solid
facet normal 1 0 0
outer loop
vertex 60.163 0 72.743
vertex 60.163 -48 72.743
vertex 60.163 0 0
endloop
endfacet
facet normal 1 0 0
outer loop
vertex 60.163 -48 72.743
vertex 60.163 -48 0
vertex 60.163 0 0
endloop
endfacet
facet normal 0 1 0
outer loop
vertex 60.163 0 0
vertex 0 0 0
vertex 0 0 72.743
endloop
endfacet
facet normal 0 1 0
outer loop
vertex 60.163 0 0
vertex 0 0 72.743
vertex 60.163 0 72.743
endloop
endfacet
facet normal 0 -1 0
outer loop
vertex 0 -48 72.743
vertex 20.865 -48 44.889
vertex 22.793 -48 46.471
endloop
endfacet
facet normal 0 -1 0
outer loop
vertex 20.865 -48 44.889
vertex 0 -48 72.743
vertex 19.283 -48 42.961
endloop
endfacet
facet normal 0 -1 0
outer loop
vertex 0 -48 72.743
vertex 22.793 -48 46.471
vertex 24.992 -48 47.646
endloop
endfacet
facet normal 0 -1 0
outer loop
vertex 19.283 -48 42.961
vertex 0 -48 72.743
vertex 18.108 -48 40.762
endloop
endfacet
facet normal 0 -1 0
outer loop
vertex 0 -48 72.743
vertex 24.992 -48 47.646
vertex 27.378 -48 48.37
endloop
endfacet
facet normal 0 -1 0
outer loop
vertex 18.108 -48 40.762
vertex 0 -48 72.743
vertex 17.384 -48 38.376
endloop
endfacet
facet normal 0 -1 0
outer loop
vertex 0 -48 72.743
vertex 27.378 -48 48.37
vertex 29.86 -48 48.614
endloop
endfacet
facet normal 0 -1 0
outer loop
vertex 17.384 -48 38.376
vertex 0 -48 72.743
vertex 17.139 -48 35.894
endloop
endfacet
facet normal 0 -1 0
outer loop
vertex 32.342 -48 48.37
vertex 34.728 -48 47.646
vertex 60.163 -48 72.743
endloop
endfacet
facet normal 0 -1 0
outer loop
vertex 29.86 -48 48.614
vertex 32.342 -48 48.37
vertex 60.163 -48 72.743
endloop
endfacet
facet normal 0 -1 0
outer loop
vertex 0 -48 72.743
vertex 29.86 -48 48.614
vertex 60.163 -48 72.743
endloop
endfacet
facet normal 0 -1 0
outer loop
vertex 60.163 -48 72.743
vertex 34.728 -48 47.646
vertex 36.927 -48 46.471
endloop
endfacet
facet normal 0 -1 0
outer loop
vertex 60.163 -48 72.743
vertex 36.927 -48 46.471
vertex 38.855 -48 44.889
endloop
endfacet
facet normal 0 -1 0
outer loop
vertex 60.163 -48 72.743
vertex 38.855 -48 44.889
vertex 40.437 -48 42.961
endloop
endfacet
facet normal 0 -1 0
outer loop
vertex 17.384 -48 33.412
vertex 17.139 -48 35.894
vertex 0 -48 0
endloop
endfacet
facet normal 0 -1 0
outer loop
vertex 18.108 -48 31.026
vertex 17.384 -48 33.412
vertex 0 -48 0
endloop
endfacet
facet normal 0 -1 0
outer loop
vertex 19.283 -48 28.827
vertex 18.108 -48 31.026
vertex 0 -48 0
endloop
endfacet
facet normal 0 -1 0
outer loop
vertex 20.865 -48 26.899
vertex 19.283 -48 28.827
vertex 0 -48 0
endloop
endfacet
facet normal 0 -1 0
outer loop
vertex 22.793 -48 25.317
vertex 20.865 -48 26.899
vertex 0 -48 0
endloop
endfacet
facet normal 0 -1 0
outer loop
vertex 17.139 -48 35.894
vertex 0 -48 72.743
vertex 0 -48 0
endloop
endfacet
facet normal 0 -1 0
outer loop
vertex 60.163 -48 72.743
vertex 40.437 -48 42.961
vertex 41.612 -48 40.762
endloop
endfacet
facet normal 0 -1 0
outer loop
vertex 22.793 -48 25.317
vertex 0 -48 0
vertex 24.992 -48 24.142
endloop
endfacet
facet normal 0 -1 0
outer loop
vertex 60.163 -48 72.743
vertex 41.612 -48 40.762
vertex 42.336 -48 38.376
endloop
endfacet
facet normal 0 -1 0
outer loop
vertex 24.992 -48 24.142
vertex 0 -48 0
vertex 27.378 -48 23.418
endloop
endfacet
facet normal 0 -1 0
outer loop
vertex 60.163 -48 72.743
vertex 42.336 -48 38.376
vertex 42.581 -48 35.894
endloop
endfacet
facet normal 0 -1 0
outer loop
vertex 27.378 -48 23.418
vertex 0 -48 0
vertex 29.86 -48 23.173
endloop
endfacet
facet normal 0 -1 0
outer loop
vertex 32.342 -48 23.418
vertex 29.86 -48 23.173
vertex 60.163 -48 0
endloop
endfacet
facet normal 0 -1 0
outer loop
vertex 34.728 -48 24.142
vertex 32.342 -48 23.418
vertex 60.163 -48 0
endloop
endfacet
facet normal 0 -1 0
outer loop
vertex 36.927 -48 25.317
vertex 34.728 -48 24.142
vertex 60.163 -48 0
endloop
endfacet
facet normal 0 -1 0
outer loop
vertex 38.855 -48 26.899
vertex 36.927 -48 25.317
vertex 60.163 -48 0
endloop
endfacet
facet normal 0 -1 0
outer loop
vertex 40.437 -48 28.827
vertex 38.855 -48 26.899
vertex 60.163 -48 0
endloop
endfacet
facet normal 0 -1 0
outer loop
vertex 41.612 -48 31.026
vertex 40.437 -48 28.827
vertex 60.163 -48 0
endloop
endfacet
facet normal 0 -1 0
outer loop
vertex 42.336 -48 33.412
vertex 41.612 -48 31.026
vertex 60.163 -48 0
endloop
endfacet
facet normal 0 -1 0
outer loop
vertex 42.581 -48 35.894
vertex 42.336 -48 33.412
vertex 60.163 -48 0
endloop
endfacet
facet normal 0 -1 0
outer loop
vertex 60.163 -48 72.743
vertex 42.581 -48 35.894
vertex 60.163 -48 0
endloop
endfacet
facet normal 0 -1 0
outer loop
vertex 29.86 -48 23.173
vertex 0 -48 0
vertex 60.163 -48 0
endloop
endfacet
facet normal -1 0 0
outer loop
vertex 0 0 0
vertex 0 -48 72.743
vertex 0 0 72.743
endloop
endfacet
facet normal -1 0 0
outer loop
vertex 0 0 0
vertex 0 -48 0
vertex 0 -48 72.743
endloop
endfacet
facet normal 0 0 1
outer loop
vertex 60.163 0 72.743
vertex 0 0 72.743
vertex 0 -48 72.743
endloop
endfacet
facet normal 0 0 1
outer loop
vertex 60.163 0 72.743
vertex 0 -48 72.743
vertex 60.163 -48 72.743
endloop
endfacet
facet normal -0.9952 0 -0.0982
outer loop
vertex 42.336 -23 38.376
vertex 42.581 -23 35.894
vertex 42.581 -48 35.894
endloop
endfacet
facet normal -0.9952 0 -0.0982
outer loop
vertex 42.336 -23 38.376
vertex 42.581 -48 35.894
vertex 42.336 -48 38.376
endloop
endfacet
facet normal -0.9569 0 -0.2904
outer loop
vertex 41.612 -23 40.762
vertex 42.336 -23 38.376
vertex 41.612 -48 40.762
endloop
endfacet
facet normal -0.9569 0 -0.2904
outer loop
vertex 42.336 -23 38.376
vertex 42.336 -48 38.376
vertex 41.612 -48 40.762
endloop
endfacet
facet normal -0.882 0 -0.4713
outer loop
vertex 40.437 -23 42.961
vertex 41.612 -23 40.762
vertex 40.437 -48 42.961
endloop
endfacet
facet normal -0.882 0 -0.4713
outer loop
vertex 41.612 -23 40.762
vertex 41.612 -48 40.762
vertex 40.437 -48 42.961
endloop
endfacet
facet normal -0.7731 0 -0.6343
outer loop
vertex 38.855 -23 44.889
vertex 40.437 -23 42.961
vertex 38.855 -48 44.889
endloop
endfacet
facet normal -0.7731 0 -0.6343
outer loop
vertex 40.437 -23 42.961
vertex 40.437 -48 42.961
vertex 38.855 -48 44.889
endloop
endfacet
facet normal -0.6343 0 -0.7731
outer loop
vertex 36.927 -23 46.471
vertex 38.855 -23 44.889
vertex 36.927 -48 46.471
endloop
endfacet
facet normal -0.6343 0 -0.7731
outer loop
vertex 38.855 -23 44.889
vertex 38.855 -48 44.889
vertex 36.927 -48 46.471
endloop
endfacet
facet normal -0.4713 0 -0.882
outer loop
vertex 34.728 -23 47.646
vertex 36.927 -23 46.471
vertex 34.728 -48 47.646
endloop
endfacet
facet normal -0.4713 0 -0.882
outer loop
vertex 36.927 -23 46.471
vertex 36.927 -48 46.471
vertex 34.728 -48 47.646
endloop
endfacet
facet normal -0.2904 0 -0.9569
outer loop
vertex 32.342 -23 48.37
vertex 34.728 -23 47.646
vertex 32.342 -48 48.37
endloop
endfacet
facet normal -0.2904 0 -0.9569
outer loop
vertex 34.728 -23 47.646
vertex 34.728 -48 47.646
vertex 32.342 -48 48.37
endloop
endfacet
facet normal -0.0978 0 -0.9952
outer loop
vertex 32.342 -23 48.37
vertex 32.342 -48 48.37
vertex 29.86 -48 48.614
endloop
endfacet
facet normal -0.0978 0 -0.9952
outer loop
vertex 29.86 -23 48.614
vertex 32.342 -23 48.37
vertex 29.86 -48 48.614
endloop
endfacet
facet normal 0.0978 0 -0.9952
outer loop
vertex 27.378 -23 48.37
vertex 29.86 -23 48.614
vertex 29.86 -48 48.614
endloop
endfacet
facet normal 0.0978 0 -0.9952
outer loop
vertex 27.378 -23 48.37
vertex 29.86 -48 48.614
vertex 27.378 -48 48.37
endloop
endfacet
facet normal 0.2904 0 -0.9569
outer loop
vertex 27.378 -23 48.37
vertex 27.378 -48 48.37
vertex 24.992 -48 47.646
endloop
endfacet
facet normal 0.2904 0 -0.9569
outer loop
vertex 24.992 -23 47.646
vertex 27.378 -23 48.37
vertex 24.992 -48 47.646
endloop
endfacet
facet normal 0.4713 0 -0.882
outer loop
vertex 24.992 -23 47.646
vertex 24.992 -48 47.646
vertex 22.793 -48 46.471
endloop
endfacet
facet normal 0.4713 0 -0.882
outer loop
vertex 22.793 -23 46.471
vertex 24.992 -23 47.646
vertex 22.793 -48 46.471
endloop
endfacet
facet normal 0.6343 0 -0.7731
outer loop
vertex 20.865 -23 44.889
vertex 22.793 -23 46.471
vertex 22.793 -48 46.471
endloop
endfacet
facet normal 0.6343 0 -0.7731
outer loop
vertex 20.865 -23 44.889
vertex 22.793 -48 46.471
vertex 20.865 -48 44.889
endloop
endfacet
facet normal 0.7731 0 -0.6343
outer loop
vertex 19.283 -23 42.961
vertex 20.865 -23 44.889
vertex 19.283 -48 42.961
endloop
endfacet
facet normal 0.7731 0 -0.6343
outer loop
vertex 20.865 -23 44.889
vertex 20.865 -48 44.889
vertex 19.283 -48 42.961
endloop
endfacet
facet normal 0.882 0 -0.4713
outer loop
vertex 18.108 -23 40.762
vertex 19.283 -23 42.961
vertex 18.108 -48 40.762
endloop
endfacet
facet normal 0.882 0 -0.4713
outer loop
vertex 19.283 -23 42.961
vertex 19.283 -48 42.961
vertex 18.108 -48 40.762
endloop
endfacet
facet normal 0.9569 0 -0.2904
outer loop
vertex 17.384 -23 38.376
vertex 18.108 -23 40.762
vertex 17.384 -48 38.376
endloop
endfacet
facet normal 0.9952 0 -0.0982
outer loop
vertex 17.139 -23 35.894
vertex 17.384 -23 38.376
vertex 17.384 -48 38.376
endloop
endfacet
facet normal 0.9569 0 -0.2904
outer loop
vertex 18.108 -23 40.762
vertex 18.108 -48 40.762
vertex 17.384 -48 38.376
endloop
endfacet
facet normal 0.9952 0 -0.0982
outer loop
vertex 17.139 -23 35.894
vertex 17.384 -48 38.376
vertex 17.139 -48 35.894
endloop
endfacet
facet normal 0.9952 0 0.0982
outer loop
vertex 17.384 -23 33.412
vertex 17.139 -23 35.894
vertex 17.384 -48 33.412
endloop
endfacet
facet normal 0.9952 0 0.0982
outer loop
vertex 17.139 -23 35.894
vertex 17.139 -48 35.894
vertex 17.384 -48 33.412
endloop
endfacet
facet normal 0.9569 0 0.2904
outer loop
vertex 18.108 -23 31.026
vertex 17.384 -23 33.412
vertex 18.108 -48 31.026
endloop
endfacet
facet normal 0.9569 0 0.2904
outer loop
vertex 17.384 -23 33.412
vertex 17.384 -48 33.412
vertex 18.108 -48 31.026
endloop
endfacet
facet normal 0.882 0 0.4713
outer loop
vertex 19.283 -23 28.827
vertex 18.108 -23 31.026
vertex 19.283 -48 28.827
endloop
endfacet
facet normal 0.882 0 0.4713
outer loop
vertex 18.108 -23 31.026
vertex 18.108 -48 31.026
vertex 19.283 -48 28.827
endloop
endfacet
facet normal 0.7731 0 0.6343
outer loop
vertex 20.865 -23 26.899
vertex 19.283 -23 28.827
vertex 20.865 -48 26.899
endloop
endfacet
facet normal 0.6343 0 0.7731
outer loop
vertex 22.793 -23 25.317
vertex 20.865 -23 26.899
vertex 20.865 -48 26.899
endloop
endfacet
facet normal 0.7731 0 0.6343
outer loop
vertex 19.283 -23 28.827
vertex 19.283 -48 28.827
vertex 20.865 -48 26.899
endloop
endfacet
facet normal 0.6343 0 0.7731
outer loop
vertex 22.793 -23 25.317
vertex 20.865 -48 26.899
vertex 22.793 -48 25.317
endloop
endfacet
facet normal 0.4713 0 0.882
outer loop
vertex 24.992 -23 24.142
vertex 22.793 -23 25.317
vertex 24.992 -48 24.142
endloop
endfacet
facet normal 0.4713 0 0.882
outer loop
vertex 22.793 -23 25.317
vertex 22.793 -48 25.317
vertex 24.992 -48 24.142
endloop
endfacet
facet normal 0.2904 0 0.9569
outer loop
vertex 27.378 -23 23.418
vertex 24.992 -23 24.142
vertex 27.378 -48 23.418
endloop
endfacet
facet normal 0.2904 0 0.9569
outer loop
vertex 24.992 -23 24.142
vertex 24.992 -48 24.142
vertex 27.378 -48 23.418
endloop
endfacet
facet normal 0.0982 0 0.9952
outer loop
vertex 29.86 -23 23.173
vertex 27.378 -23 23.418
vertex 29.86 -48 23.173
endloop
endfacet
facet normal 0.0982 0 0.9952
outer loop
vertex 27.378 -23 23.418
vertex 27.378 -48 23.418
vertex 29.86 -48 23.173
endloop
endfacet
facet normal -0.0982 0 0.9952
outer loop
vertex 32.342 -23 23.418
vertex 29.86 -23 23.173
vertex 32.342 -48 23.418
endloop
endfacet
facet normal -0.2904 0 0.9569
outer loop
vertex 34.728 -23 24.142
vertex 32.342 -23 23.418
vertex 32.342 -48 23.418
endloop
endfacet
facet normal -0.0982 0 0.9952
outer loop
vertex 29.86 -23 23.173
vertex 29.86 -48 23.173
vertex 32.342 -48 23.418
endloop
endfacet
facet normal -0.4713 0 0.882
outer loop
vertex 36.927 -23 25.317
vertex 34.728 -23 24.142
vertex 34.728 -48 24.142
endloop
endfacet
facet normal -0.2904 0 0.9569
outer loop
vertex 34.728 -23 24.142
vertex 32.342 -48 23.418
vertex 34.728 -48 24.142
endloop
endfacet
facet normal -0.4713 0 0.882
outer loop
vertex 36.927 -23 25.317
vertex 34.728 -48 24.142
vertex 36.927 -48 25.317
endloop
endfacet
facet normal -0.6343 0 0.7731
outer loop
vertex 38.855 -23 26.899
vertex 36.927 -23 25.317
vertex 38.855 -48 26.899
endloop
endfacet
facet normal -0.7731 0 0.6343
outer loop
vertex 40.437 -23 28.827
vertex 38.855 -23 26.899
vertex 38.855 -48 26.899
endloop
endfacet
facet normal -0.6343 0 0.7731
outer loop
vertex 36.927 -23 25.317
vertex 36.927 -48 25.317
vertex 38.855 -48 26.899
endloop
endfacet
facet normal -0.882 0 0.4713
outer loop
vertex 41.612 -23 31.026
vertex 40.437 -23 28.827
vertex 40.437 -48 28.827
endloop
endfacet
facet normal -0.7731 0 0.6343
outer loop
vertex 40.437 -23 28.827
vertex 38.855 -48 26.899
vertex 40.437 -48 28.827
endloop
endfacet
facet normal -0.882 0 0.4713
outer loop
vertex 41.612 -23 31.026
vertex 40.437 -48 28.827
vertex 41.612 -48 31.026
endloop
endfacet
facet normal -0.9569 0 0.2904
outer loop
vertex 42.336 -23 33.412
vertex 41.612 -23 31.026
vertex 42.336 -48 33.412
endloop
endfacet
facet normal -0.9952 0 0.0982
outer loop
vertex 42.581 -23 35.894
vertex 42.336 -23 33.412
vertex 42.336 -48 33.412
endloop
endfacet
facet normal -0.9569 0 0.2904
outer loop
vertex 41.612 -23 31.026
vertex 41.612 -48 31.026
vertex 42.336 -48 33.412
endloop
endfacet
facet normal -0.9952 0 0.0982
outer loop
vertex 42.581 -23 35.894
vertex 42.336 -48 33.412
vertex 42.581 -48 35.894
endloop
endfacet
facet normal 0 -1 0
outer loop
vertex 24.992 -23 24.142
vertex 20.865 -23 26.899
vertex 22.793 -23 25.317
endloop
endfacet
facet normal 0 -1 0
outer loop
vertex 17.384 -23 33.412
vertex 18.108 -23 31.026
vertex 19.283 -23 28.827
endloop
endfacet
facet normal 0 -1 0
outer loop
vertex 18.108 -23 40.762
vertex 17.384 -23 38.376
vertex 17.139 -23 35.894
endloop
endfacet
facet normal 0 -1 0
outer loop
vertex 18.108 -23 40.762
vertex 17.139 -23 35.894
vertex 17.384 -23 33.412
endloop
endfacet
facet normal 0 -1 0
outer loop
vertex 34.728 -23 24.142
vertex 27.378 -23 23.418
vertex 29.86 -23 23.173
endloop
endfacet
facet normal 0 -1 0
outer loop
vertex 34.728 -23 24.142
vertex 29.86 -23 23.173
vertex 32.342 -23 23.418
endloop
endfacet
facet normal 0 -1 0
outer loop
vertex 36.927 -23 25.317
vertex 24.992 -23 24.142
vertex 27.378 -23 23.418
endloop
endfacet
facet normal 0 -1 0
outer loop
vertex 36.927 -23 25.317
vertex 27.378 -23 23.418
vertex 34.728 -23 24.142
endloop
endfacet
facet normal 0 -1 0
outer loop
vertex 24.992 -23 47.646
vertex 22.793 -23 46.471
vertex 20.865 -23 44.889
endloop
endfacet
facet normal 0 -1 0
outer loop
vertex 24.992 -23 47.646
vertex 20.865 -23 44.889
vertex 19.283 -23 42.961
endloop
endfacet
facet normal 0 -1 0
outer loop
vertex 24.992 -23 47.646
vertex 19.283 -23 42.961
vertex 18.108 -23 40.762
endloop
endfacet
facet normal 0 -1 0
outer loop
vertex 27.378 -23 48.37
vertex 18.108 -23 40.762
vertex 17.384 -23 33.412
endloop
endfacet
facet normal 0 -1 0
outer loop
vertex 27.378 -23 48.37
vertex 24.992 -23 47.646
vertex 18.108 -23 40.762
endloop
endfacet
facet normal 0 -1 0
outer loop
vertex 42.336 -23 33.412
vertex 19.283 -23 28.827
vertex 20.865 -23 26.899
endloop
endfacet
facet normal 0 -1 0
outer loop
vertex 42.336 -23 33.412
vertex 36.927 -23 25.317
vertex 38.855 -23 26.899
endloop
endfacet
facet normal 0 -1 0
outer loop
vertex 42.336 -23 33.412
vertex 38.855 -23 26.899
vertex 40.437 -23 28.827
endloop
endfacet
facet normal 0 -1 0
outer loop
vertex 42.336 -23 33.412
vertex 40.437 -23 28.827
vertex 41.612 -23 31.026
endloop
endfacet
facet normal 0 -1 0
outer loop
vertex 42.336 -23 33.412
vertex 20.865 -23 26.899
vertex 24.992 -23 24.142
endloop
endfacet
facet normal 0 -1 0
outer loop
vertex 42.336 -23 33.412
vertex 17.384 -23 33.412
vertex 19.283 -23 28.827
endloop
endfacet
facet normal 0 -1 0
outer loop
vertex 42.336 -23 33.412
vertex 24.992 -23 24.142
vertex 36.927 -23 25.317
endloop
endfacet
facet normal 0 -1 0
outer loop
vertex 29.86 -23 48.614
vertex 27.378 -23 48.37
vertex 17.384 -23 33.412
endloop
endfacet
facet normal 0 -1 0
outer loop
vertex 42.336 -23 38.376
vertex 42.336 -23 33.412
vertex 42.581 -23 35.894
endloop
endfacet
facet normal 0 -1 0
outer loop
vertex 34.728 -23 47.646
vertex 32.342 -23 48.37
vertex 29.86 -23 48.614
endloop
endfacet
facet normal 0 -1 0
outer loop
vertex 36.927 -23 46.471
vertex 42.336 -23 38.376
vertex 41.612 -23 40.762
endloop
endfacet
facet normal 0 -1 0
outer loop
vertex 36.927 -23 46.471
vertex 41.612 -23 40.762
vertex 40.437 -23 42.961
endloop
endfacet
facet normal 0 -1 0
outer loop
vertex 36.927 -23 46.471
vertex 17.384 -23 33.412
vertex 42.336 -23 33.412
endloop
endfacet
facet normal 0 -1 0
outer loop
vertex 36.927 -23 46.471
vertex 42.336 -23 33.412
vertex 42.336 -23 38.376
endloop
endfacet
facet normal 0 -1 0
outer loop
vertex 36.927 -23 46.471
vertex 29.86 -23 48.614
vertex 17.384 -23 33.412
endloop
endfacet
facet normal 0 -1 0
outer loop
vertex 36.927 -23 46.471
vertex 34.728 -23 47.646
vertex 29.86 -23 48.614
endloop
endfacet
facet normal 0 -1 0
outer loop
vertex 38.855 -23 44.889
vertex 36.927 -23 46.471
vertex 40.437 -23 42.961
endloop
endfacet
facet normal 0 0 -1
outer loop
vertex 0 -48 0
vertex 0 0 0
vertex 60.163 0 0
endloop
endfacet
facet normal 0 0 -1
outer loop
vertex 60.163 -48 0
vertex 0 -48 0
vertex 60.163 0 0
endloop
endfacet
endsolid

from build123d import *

# Parameters (mm, degrees)
F0_W      = 60.16257
F0_H      = 62.742576
F1_DEPTH  = 48
F1_FACE_W = 60.16257
F1_FACE_H = 48
F2_DEPTH  = 10
F4_R      = 12.38494
F5_DEPTH  = 30
F3_R      = 12.720557
F6_DEPTH  = 25


with BuildPart() as f1:
    # F0 (on Front) → F1 (new body)
    with BuildSketch(Plane.XZ):
        with Locations((30.081285, 31.371288)):
            Rectangle(F0_W, F0_H)
    extrude(amount=F1_DEPTH)

    # F1_face (on face) → F2 (join)
    with BuildSketch(Plane(origin=(30.081285, -24, 62.742576), x_dir=(1, 0, 0), z_dir=(0, 0, 1))):
        Rectangle(F1_FACE_W, F1_FACE_H)
    extrude(amount=F2_DEPTH)

    # F4 (on face) → F5 (join)
    with BuildSketch(Plane.XZ.offset(48)):
        with Locations((30.478884, 35.89391)):
            Circle(F4_R)
    extrude(amount=-F5_DEPTH)

    # F3 (on face) → F6 (cut)
    with BuildSketch(Plane.XZ.offset(48)):
        with Locations((29.86002, 35.89391)):
            Circle(F3_R)
    extrude(amount=-F6_DEPTH, mode=Mode.SUBTRACT)


solid = f1.part
